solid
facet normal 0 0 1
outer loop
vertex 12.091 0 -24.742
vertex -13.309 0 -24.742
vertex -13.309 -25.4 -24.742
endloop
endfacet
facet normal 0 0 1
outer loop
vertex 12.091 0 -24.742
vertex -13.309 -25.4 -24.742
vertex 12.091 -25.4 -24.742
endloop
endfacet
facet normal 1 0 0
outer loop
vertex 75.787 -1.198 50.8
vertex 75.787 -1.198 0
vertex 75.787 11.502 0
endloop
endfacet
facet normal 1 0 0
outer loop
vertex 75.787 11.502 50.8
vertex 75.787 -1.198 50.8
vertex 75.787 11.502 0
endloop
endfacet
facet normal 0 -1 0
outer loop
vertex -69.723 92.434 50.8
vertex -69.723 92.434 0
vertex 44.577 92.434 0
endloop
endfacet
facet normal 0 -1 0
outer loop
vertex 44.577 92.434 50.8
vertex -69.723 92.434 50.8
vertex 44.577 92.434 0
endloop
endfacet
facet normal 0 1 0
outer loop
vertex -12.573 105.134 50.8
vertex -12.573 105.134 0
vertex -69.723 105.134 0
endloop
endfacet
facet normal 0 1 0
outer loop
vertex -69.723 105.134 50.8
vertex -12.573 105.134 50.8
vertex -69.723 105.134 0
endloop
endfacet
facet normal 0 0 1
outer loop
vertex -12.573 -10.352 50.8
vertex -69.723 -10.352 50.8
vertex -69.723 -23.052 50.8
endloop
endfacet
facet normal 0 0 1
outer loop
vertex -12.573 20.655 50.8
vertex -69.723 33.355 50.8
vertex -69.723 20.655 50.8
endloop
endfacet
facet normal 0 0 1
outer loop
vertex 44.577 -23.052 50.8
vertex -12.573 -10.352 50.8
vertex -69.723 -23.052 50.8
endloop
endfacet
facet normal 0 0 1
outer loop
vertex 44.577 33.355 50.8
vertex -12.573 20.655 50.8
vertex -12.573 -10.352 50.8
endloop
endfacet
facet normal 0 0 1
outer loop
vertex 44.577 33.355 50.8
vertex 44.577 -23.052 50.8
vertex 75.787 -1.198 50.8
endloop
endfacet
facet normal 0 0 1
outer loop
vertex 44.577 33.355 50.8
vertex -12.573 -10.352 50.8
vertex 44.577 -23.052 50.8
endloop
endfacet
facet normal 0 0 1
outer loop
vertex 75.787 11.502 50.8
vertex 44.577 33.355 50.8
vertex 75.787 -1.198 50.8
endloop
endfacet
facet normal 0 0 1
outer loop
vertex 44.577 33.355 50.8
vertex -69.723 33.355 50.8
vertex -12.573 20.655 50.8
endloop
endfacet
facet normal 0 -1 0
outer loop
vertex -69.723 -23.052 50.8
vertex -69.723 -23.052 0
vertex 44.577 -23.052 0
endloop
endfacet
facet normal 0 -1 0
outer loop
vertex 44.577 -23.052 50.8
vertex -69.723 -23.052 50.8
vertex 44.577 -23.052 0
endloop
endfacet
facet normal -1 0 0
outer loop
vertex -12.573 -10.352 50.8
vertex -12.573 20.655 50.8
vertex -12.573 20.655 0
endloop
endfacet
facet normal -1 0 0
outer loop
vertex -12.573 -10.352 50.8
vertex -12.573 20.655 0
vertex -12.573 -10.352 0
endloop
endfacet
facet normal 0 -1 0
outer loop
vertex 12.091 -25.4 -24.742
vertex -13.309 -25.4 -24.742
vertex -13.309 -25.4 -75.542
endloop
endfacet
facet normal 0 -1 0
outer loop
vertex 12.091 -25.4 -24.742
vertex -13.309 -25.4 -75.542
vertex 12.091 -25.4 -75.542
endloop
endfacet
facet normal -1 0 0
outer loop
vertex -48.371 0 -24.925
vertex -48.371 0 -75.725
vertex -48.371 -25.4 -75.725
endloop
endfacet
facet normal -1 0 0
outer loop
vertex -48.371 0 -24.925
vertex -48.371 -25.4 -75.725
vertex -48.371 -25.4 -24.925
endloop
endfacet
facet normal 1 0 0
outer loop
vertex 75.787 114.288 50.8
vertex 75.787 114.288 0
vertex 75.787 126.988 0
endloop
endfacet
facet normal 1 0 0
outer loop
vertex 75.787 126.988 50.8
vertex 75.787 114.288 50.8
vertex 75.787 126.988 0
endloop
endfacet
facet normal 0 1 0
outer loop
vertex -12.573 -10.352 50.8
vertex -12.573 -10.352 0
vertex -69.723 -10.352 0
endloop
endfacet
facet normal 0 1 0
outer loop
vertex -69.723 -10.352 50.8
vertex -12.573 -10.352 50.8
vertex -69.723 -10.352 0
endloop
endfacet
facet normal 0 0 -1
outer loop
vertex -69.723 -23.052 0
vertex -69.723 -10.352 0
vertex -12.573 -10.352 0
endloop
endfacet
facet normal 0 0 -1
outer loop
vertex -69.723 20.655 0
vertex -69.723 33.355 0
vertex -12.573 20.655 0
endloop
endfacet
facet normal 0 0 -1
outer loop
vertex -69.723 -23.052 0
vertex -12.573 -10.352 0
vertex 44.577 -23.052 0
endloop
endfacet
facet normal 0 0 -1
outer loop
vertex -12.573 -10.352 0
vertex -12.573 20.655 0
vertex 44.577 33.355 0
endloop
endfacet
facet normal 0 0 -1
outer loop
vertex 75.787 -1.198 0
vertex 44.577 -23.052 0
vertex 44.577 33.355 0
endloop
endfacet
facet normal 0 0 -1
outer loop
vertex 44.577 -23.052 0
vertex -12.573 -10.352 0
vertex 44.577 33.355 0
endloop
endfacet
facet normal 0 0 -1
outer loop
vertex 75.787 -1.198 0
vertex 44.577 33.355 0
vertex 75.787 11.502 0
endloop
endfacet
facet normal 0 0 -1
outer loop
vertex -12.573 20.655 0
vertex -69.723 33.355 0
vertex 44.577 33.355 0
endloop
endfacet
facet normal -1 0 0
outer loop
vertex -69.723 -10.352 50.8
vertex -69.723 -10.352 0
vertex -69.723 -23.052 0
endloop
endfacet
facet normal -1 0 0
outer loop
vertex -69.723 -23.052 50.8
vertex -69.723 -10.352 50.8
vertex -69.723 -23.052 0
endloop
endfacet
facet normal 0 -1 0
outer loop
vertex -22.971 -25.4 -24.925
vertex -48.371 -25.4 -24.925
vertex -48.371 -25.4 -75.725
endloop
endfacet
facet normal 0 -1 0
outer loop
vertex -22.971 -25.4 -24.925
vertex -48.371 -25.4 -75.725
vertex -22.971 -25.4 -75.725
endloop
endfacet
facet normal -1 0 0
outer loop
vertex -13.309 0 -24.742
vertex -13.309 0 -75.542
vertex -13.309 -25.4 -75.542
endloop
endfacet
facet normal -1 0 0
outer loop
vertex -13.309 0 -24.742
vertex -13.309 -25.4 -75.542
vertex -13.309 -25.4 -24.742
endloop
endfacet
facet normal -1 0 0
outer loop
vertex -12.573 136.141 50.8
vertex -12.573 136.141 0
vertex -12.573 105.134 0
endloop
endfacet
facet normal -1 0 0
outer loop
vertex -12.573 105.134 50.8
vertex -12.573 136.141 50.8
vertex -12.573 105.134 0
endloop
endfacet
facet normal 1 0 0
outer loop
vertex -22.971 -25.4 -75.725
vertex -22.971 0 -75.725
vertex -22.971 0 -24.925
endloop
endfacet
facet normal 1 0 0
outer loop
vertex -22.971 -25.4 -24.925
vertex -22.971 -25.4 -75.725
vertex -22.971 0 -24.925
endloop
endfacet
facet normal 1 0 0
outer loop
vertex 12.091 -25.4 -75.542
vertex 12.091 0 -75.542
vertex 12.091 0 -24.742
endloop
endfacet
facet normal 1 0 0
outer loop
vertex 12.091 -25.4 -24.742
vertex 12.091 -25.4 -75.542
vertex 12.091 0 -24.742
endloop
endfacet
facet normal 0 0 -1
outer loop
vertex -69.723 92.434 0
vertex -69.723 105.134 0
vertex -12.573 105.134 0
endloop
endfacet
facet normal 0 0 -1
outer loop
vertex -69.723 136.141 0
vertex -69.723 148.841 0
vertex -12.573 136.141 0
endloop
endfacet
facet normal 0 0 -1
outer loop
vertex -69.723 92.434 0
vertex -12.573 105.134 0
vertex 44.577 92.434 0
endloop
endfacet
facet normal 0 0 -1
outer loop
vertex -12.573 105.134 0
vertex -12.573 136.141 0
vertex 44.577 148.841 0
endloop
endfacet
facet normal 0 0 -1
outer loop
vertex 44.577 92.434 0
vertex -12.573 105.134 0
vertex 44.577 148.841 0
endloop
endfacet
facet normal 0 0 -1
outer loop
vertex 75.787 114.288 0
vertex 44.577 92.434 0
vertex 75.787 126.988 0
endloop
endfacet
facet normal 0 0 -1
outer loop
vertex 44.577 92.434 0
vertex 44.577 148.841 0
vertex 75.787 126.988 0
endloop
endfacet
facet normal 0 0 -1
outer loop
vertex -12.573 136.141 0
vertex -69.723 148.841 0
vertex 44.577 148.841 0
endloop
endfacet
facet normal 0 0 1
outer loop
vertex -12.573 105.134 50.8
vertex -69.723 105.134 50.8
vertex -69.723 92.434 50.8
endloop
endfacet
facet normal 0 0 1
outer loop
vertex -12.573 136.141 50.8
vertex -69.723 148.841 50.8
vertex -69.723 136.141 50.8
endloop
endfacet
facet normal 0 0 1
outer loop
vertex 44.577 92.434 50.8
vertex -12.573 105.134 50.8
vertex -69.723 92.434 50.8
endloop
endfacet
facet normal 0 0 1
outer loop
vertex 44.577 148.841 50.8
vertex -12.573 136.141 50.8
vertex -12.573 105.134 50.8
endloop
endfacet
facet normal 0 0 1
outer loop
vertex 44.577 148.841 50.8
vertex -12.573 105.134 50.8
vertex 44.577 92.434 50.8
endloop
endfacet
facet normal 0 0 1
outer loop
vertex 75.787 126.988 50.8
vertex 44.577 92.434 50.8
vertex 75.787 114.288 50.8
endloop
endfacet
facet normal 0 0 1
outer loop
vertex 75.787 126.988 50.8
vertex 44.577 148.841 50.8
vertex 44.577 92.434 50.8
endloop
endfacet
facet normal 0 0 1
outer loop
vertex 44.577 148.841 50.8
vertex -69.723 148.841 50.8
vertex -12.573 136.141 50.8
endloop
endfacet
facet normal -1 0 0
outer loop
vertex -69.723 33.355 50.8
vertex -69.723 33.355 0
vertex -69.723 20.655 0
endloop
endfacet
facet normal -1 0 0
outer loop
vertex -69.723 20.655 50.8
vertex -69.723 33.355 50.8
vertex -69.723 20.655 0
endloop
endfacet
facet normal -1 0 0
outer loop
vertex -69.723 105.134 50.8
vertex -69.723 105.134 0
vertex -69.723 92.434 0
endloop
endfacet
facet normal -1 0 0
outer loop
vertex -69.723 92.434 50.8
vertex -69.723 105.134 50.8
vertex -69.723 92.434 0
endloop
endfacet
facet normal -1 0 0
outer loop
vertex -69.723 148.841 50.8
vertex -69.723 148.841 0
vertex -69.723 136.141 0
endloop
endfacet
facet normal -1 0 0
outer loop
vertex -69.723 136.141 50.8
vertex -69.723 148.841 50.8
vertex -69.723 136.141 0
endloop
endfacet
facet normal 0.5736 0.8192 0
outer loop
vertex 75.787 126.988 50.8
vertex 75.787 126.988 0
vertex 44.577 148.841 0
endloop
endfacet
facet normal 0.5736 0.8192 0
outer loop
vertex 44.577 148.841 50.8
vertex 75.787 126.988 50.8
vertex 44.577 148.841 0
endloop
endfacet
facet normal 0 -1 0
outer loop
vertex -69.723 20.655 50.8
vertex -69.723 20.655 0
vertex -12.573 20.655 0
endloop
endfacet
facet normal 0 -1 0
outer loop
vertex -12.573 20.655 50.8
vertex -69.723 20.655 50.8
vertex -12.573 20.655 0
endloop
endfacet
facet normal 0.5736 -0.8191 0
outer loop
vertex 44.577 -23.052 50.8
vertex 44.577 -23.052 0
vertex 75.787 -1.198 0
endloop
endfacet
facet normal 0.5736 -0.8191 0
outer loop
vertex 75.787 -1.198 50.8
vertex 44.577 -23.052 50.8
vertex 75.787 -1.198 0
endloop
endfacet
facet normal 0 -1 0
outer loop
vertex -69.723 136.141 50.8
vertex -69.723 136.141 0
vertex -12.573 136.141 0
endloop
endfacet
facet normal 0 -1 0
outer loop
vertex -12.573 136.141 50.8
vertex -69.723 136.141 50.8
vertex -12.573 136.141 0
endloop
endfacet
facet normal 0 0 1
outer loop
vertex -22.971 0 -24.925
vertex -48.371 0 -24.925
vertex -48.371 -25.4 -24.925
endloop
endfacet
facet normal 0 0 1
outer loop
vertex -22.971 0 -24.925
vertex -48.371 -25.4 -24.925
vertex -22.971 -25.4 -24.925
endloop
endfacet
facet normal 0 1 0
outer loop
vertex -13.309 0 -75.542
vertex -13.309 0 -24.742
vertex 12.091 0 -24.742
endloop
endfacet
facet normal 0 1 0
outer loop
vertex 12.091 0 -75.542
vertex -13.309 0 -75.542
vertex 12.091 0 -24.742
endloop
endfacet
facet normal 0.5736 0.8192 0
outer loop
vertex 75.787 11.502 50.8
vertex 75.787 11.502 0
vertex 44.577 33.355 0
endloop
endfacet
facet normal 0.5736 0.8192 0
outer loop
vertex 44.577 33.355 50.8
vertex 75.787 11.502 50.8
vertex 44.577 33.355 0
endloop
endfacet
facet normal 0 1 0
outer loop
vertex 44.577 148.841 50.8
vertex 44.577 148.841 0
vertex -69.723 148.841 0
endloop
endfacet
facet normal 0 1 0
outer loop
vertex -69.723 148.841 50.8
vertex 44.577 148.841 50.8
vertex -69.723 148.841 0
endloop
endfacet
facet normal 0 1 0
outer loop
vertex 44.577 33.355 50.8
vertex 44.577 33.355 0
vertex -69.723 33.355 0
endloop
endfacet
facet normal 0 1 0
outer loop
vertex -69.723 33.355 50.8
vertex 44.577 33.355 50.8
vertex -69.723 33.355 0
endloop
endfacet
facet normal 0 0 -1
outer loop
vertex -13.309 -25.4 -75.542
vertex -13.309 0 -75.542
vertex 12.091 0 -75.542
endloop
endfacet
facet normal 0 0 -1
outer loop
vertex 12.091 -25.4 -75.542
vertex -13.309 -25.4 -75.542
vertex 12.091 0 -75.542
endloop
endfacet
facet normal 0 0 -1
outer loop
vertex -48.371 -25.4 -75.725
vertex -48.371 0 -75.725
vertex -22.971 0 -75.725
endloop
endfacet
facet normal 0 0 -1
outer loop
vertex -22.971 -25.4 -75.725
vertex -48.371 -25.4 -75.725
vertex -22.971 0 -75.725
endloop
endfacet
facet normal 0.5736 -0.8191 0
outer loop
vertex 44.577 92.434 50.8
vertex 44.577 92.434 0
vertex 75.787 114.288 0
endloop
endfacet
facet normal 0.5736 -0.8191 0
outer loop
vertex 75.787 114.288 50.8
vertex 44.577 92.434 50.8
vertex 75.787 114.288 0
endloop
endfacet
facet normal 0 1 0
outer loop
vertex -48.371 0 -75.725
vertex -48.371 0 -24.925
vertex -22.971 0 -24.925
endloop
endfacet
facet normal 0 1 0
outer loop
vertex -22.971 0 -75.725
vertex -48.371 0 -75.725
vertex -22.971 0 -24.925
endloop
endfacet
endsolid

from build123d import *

# Parameters (mm, degrees)
F0_W     = 25.4
F0_H     = 50.8
F1_DEPTH = 25.4
F3_DEPTH = 50.8


with BuildPart() as f1:
    # F0 (on Front) → F1 (new body)
    with BuildSketch(Plane.XZ):
        with Locations((-35.671202, -50.324684)):
            Rectangle(F0_W, F0_H)
        with Locations((-0.608555, -50.141936)):
            Rectangle(F0_W, F0_H)
    extrude(amount=F1_DEPTH)


with BuildPart() as f3:
    # F2 (on Top) → F3 (new body)
    with BuildSketch(Plane.XY):
        Polygon((44.576997, 33.354819), (-69.723003, 33.354819), (-69.723003, 20.654819), (-12.573003, 20.654819), (-12.573003, -10.351706), (-69.723003, -10.351706), (-69.723003, -23.051706), (44.576997, -23.051706), (75.78669, -1.198443), (75.78669, 11.501557), align=None)
        Polygon((-69.723003, 105.134302), (-69.723003, 92.434302), (44.576997, 92.434302), (75.78669, 114.287564), (75.78669, 126.987564), (44.576997, 148.840826), (-69.723003, 148.840826), (-69.723003, 136.140826), (-12.573003, 136.140826), (-12.573003, 105.134302), align=None)
    extrude(amount=F3_DEPTH)


solid = Compound([f1.part, f3.part])
